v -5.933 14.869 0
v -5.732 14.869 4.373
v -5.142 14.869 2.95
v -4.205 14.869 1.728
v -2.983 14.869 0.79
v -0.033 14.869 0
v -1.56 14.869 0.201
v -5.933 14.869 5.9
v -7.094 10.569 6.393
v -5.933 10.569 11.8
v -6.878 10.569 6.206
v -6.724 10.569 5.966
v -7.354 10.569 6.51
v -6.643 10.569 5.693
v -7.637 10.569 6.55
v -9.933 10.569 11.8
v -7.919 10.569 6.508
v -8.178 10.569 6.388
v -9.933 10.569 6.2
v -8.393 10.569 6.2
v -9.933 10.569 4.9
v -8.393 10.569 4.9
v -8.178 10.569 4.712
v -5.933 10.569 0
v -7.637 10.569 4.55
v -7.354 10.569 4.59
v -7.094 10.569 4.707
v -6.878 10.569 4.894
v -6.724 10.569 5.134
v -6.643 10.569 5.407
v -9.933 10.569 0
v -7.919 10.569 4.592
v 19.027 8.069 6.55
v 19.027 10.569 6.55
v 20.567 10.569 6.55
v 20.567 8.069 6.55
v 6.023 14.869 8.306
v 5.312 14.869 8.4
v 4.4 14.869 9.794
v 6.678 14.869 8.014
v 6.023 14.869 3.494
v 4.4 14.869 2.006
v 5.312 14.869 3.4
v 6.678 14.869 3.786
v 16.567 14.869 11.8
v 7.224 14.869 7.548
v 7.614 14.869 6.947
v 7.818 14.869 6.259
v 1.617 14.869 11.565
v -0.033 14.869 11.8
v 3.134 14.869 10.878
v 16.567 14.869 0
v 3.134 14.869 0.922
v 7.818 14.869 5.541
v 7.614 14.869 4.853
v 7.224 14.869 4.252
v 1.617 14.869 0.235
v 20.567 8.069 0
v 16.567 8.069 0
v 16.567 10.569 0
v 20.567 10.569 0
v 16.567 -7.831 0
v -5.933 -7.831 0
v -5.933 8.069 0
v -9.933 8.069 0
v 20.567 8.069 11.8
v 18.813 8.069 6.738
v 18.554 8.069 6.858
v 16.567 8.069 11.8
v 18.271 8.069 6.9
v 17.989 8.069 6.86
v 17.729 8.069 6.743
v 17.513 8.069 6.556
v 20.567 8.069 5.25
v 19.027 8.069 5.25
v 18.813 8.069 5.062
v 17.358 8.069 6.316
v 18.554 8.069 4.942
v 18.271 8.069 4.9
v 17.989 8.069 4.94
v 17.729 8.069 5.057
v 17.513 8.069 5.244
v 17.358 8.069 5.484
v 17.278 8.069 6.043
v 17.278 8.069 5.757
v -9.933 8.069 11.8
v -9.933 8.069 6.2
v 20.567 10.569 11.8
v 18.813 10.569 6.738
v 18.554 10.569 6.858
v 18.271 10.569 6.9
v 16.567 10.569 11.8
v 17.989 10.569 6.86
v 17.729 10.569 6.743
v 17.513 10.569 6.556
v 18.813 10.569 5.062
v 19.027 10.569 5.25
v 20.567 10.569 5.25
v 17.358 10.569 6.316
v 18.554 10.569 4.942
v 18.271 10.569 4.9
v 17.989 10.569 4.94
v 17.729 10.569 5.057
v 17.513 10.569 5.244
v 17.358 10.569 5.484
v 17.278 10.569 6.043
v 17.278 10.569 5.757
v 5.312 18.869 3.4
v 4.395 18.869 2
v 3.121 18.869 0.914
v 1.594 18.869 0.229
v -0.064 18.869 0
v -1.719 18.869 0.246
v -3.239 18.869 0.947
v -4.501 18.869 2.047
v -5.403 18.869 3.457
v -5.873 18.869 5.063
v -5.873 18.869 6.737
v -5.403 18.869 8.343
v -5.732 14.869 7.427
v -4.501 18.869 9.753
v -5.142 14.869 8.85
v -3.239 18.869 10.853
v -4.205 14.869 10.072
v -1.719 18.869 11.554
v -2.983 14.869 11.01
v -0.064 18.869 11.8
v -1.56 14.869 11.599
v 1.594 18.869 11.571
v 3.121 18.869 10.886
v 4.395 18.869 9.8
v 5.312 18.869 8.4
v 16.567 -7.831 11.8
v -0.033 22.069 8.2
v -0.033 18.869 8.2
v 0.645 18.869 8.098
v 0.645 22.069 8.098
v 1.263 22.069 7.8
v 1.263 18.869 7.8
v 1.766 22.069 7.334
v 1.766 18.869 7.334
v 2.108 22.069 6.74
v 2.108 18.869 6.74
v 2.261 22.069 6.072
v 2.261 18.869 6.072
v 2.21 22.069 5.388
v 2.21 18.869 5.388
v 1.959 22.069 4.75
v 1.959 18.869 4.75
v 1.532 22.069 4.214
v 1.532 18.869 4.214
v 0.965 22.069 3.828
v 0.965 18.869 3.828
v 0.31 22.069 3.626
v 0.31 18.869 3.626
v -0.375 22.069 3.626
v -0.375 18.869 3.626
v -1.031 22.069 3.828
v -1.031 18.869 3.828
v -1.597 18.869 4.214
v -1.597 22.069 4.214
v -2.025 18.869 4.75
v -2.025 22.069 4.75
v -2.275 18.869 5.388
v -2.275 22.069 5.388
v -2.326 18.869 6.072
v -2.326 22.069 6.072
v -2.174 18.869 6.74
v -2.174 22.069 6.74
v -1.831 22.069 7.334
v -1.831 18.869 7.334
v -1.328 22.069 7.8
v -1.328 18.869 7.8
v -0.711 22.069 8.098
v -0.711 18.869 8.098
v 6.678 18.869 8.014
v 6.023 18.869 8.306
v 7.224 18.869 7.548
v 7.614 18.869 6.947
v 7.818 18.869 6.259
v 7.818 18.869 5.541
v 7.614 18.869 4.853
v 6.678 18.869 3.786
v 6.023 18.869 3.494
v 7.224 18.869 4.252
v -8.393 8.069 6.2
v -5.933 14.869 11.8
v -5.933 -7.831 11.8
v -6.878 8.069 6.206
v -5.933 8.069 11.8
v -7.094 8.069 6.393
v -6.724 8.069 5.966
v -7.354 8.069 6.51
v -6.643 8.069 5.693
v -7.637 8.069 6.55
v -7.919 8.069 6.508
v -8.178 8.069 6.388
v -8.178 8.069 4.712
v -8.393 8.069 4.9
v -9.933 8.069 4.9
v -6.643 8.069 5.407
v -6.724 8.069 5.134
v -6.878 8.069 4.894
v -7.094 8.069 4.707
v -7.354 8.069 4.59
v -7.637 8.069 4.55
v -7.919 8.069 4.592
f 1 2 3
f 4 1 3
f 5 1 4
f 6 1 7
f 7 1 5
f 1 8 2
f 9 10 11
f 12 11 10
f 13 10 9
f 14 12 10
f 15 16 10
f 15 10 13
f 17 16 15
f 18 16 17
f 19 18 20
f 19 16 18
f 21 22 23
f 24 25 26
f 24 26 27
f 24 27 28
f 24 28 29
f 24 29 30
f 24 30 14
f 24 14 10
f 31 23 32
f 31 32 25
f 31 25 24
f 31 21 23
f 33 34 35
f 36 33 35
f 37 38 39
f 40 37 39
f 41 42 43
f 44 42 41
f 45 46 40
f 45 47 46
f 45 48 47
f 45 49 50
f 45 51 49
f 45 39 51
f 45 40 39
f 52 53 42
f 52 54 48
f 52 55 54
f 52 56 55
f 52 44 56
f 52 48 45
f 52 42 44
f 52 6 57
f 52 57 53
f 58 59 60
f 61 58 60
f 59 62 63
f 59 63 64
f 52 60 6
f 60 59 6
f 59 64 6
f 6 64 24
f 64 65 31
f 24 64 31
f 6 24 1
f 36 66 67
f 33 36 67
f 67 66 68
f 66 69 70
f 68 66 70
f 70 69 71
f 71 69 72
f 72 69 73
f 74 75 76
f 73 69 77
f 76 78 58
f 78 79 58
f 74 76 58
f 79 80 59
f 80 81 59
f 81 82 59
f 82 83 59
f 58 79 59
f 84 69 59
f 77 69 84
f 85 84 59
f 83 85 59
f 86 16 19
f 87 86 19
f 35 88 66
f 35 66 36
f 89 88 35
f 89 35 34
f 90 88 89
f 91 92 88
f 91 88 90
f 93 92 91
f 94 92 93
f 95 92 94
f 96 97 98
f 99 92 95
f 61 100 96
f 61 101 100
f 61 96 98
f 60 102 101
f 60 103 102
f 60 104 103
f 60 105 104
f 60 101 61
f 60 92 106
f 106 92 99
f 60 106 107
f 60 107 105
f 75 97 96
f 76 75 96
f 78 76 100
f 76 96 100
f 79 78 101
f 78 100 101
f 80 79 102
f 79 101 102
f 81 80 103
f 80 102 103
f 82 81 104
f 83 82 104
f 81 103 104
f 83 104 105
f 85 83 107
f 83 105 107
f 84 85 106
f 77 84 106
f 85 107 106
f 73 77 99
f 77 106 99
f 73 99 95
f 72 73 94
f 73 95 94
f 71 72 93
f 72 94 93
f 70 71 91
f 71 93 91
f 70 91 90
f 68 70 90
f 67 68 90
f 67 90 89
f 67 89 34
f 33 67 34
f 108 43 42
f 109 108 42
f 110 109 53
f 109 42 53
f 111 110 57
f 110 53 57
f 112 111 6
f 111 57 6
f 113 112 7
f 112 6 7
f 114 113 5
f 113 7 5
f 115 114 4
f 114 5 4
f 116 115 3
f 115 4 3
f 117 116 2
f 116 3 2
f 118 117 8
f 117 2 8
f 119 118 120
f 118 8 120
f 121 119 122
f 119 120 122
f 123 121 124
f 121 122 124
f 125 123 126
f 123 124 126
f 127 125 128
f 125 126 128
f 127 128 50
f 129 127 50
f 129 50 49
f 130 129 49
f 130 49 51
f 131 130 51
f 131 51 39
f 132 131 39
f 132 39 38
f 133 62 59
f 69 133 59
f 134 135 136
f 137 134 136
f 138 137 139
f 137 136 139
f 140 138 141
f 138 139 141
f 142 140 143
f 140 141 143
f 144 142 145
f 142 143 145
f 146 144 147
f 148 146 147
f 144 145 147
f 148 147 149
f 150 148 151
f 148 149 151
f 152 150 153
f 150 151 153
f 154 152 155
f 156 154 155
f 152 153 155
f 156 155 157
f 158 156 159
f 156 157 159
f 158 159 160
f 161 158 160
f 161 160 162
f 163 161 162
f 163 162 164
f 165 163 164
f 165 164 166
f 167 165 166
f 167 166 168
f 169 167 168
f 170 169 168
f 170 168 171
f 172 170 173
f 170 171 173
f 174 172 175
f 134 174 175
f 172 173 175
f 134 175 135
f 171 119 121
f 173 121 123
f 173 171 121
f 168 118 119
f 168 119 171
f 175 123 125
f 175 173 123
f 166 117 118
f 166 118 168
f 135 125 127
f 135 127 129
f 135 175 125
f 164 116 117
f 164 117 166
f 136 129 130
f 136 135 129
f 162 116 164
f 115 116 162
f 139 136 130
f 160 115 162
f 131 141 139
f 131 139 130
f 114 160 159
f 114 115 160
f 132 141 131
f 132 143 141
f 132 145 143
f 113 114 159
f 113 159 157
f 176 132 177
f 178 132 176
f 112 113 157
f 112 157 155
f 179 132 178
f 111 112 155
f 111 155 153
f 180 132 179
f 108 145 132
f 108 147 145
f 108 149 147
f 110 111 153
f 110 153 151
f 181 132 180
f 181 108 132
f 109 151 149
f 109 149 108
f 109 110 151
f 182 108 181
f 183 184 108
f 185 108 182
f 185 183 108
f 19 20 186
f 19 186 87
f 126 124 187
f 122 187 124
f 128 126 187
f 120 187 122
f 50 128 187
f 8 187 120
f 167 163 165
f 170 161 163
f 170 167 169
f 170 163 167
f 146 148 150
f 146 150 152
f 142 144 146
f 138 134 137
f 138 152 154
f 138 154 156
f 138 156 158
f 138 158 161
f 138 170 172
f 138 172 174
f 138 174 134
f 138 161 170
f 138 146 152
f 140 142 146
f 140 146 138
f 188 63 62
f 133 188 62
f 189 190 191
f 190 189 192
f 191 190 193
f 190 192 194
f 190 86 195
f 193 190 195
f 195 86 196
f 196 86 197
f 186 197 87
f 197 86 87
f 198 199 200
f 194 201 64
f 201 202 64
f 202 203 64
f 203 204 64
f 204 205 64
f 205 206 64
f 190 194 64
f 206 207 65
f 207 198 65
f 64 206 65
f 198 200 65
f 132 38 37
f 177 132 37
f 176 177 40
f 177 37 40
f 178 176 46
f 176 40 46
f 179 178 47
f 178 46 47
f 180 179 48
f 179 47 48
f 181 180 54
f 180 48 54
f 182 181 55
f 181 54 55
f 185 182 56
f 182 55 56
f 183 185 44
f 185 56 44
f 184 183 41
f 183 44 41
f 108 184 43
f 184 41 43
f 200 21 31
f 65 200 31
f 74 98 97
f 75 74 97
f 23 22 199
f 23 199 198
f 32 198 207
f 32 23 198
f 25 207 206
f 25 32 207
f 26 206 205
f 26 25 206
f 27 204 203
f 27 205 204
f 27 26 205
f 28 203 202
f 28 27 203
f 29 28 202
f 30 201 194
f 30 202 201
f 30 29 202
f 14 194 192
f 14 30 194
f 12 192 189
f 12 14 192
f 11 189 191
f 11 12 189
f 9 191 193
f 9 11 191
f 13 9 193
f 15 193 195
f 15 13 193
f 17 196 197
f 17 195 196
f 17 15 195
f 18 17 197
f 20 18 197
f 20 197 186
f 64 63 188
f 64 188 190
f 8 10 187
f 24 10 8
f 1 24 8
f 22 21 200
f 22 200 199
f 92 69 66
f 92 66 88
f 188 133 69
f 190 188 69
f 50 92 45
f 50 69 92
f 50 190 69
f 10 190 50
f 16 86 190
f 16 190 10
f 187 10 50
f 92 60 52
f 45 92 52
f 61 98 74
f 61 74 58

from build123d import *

# Parameters (mm, degrees)
SKETCH2_W                = 22.5
SKETCH2_H                = 22.7
BOSS_EXTRUDE1_DEPTH      = 11.8
SKETCH3_R                = 5.9
BOSS_EXTRUDE2_DEPTH      = 4
SKETCH4_R                = 2.3
BOSS_EXTRUDE3_DEPTH      = 3.2
BOSS_EXTRUDE4_DEPTH      = 4
BOSS_EXTRUDE4_DEPTH_BACK = 26.5
SKETCH5_W                = 11.8
SKETCH5_H                = 2.5
CUT_EXTRUDE1_REACH       = 32.014


with BuildPart() as part:
    # Sketch2 → Boss-Extrude1 (new body)
    with BuildSketch(Plane.XY):
        with Locations((5.317300213, 3.518634424)):
            Rectangle(SKETCH2_W, SKETCH2_H)
    extrude(amount=BOSS_EXTRUDE1_DEPTH)

    # Sketch3 → Boss-Extrude2 (add)
    with BuildSketch(Plane(origin=(0, 14.868634424, 0), x_dir=(1, 0, 0), z_dir=(0, 1, 0))):
        with Locations((-0.032699787, -5.9)):
            Circle(SKETCH3_R)
        with BuildLine():
            ThreePointArc((5.31155509, -3.400212046), (5.726688366, -4.619590646), (5.867300213, -5.9))
            ThreePointArc((5.867300213, -5.9), (5.726688366, -7.180409354), (5.31155509, -8.399787954))
            ThreePointArc((5.31155509, -8.399787954), (7.844115569, -5.9), (5.31155509, -3.400212046))
        make_face()
    extrude(amount=BOSS_EXTRUDE2_DEPTH)

    # Sketch4 → Boss-Extrude3 (add)
    with BuildSketch(Plane(origin=(0, 18.868634424, 0), x_dir=(1, 0, 0), z_dir=(0, 1, 0))):
        with Locations(Location((-0.032699787, -5.9, 0), (0, 0, 270))):
            Circle(SKETCH4_R)
    extrude(amount=BOSS_EXTRUDE3_DEPTH)

    # Sketch5 → Boss-Extrude4 (add, two sides: drawn at the far end of the back side and taken through both)
    with BuildSketch(Plane(origin=(16.567300213, 0, 0), x_dir=(0, 0, -1), z_dir=(1, 0, 0)).offset(-BOSS_EXTRUDE4_DEPTH_BACK)):
        with Locations((-5.9, 9.318634424)):
            Rectangle(SKETCH5_W, SKETCH5_H)
    extrude(amount=BOSS_EXTRUDE4_DEPTH + BOSS_EXTRUDE4_DEPTH_BACK)

    # Sketch7 → Cut-Extrude1 (cut, up to next)
    with BuildSketch(Plane(origin=(0, 10.568634424, 0), x_dir=(1, 0, 0), z_dir=(0, 1, 0)), mode=Mode.PRIVATE) as cut_extrude1_sk1:
        with BuildLine():
            Line((20.567300213, -6.55), (20.567300213, -5.25))
            Line((20.567300213, -5.25), (19.027234421, -5.25))
            ThreePointArc((19.027234421, -5.25), (17.267300213, -5.9), (19.027234421, -6.55))
            Line((19.027234421, -6.55), (20.567300213, -6.55))
        make_face()
    cut_extrude1_tool1 = extrude(cut_extrude1_sk1.sketch, amount=-CUT_EXTRUDE1_REACH, mode=Mode.PRIVATE) & part.part
    # Sketch7 → Cut-Extrude1 (cut, up to next)
    with BuildSketch(Plane(origin=(0, 10.568634424, 0), x_dir=(1, 0, 0), z_dir=(0, 1, 0)), mode=Mode.PRIVATE) as cut_extrude1_sk2:
        with BuildLine():
            ThreePointArc((-8.392633994, -4.9), (-6.632699787, -5.55), (-8.392633994, -6.2))
            Line((-8.392633994, -6.2), (-9.932699787, -6.2))
            Line((-9.932699787, -6.2), (-9.932699787, -4.9))
            Line((-9.932699787, -4.9), (-8.392633994, -4.9))
        make_face()
    cut_extrude1_tool2 = extrude(cut_extrude1_sk2.sketch, amount=-CUT_EXTRUDE1_REACH, mode=Mode.PRIVATE) & part.part
    add(cut_extrude1_tool1.solids().sort_by_distance((18.851481, 10.568634, 5.9))[0], mode=Mode.SUBTRACT)
    add(cut_extrude1_tool2.solids().sort_by_distance((-8.216881, 10.568634, 5.55))[0], mode=Mode.SUBTRACT)


solid = part.part
